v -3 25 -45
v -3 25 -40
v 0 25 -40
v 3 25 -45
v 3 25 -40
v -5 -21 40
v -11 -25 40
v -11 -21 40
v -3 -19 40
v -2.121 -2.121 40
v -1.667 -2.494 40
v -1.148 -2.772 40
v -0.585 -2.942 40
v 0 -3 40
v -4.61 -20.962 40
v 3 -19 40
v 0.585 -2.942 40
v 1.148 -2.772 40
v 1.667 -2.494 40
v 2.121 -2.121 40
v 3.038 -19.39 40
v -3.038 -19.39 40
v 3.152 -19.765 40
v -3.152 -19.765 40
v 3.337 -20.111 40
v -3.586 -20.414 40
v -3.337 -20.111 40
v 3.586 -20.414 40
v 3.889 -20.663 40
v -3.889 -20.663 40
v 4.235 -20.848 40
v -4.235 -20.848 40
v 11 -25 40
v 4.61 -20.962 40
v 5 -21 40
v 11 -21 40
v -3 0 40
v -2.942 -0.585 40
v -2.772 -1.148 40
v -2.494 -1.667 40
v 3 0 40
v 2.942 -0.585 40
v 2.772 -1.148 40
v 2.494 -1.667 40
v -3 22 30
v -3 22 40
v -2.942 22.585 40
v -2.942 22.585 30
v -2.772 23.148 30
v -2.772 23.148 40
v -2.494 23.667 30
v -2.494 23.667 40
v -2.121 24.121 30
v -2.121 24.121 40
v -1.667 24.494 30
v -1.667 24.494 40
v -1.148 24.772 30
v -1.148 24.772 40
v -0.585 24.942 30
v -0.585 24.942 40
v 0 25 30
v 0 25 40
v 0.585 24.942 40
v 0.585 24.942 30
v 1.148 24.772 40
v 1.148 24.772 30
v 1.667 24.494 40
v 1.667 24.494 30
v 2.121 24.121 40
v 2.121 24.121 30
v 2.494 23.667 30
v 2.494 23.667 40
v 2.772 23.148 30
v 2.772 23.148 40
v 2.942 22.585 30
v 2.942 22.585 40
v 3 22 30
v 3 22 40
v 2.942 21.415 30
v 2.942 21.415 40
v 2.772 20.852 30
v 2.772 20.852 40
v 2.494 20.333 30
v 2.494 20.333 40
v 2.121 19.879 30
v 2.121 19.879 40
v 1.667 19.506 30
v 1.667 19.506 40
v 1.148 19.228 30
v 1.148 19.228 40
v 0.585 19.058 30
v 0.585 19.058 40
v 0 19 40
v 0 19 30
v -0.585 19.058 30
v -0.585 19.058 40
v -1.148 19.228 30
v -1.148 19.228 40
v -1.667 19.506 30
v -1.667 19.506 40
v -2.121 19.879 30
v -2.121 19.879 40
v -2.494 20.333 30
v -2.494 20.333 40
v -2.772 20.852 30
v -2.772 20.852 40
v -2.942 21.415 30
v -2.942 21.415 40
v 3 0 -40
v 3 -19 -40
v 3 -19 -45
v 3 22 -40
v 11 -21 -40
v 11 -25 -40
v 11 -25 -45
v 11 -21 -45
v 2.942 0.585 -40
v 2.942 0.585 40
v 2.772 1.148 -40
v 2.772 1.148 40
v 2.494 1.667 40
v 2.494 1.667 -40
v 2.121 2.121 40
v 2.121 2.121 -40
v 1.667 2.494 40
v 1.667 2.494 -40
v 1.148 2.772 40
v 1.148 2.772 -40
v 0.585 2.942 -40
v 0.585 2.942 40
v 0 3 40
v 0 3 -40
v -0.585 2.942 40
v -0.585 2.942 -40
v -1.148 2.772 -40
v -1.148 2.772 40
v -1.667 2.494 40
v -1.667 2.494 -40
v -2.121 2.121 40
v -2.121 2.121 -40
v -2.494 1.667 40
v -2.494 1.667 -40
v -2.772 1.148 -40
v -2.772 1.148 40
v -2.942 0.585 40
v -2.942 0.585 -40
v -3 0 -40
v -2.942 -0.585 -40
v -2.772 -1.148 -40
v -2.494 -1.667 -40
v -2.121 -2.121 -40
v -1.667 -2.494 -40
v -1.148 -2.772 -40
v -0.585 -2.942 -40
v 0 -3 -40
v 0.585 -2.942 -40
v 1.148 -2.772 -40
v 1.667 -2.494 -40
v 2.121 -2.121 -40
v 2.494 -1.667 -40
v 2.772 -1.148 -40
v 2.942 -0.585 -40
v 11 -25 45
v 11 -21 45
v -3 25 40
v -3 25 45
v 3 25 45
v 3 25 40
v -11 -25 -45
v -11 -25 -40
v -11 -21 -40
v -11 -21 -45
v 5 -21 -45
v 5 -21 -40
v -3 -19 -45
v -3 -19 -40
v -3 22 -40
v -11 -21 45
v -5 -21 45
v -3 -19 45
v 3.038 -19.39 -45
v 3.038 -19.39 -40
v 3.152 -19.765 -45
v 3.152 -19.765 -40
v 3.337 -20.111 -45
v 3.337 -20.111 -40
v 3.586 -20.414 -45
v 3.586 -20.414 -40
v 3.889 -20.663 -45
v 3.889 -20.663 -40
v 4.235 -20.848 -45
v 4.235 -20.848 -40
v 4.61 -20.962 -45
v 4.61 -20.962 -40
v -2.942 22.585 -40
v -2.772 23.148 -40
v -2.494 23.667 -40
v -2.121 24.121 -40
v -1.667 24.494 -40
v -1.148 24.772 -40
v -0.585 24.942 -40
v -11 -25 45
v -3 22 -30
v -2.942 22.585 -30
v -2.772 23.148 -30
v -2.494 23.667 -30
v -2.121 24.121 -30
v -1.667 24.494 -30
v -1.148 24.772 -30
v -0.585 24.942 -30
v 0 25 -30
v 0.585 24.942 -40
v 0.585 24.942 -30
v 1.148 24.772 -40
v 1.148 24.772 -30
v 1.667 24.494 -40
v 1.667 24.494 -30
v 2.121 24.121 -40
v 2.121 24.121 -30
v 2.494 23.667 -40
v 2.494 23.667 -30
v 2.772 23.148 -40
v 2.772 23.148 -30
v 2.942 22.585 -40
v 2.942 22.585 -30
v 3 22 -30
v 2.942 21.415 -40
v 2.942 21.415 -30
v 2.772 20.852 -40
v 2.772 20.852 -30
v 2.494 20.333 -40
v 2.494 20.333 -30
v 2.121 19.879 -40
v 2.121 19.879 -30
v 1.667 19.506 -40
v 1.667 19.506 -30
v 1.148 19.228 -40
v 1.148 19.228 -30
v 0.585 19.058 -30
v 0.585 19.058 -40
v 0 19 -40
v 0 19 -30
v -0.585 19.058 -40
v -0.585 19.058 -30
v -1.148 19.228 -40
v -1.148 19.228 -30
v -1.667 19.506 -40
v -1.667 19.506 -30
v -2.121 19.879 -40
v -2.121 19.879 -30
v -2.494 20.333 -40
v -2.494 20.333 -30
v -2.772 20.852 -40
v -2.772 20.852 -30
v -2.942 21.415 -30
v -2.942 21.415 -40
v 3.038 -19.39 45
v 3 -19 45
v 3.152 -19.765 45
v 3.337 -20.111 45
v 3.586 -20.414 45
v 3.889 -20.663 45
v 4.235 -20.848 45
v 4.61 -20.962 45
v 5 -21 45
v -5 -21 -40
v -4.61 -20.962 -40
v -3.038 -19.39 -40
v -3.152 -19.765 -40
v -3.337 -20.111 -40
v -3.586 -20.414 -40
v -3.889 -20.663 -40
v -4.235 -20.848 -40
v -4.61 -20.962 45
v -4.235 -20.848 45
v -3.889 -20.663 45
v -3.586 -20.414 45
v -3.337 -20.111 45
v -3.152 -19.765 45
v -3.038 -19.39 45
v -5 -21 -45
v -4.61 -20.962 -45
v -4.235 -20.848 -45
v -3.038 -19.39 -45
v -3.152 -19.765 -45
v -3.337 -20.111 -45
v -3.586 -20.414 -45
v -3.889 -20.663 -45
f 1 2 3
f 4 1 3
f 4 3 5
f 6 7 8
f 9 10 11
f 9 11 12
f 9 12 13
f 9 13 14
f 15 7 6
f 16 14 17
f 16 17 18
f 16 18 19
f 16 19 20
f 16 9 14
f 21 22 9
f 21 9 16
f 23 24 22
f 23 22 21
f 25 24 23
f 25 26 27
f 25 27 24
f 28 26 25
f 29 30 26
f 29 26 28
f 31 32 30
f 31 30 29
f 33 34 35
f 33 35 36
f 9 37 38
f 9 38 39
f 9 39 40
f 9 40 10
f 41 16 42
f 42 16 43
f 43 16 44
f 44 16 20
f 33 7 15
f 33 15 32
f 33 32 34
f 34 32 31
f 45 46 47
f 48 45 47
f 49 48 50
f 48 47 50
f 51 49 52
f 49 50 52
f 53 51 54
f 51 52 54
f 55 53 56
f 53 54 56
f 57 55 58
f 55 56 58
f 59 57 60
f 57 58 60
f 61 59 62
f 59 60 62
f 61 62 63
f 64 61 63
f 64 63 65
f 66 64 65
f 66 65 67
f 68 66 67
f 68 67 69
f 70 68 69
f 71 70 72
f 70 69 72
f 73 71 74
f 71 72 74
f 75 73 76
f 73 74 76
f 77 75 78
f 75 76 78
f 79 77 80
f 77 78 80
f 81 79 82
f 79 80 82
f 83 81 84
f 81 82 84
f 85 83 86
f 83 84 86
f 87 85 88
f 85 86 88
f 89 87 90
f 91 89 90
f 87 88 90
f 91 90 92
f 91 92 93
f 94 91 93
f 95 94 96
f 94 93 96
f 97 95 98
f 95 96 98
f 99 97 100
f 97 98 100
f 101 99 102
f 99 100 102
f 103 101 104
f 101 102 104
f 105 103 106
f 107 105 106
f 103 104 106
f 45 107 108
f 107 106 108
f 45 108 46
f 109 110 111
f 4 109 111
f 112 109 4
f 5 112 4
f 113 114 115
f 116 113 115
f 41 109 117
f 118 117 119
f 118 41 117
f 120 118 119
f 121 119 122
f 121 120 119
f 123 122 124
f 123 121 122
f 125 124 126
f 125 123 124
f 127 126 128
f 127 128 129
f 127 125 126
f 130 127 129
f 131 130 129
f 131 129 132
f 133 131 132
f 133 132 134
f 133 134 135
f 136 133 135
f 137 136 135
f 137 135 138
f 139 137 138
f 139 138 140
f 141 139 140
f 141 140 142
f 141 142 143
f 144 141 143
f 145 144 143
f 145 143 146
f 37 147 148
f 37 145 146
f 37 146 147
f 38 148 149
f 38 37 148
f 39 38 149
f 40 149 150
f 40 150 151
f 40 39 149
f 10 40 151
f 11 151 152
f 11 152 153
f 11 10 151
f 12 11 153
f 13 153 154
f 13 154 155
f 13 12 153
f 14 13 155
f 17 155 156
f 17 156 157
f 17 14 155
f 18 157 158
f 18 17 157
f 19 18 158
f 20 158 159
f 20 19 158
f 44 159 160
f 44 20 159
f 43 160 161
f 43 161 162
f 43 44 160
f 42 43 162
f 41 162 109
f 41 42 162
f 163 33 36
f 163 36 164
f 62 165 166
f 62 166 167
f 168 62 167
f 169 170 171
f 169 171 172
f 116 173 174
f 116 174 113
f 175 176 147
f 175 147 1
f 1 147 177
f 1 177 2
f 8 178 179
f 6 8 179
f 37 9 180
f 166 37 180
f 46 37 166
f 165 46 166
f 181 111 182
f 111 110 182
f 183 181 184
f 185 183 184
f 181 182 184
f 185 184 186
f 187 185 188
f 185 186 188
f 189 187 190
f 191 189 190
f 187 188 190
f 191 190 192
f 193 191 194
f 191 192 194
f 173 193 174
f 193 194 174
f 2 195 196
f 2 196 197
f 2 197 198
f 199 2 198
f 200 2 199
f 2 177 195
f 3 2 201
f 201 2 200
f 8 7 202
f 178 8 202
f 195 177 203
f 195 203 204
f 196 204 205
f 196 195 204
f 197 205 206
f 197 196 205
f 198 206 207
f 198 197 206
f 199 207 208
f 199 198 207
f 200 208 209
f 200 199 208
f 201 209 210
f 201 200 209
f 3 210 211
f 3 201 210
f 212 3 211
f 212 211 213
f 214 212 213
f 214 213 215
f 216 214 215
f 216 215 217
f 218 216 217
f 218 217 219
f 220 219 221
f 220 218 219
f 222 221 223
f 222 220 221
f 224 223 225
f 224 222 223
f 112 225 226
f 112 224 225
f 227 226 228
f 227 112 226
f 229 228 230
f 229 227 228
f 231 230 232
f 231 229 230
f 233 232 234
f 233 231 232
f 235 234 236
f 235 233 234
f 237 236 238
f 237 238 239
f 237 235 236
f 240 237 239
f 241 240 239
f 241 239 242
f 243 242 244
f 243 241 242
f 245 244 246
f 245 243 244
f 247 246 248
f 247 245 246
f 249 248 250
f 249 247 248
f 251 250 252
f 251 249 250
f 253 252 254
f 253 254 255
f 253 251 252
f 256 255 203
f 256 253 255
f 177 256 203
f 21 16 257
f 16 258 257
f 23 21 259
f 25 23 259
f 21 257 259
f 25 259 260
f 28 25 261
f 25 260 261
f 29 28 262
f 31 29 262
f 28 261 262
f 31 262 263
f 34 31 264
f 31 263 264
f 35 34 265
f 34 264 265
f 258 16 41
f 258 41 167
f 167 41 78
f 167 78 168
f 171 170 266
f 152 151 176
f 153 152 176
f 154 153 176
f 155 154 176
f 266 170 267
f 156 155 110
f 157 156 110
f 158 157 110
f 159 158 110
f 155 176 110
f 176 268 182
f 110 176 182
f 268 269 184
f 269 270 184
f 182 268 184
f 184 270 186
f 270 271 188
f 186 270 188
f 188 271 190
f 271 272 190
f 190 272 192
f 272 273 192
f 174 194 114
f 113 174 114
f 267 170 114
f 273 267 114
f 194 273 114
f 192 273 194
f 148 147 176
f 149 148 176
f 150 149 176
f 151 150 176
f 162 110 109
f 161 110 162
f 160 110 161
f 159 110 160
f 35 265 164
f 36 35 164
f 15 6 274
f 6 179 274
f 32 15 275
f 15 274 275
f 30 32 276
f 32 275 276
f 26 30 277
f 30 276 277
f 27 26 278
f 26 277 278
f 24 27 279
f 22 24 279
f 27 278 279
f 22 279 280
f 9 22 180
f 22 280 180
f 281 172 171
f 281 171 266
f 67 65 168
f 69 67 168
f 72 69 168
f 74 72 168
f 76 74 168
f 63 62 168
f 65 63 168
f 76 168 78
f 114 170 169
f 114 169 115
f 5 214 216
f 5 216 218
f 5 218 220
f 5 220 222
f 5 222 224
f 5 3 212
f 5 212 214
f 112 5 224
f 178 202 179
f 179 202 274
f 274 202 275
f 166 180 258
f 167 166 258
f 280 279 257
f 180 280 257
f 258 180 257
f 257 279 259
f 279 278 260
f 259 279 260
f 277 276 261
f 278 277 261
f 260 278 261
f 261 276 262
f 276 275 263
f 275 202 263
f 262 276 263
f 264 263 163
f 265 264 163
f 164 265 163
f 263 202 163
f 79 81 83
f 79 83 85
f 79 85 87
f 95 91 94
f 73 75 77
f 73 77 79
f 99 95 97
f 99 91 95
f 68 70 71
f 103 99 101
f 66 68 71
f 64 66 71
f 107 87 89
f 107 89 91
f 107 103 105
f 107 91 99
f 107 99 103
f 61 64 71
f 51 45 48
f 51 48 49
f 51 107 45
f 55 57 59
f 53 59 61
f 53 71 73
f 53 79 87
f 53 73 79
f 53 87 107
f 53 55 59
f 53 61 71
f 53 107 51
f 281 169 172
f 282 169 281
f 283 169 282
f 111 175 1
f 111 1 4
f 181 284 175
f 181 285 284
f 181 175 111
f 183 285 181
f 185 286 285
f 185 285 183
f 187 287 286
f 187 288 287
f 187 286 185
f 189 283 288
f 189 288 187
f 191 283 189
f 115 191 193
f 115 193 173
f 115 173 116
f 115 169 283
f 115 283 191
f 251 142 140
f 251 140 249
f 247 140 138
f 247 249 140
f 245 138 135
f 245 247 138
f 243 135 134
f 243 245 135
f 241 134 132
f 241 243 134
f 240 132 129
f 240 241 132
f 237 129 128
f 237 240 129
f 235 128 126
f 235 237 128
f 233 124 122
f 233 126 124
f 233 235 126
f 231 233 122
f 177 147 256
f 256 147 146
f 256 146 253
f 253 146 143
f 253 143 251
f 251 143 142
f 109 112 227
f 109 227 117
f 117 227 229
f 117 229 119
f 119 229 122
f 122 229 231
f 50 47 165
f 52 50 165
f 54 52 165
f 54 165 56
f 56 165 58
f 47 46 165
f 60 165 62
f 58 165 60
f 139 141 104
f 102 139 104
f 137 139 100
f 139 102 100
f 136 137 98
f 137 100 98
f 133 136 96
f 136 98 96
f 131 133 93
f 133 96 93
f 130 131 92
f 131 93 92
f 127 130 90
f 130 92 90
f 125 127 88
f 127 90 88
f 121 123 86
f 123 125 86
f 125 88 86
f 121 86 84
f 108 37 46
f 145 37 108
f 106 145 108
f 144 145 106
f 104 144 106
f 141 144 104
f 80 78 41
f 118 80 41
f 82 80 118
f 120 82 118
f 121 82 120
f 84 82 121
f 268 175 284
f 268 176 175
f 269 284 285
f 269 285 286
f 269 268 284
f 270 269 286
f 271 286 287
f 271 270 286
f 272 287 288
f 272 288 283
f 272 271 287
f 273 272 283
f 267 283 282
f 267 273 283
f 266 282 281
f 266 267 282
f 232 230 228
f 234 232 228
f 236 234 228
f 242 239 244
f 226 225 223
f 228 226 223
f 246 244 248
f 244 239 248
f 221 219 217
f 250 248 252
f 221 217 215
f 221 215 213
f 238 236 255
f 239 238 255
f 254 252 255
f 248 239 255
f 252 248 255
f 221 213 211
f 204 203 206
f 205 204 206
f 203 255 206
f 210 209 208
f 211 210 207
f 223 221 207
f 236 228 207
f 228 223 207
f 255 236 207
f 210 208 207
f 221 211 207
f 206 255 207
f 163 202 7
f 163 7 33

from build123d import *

# Parameters (mm, degrees)
SKETCH1_R            = 3
BOSS_EXTRUDE1_DEPTH  = 40
SKETCH2_W            = 6
SKETCH2_H            = 50
BOSS_EXTRUDE2_DEPTH  = 5
SKETCH9_W            = 22
SKETCH9_H            = 5
BOSS_EXTRUDE5_DEPTH  = 4
FILLET1_R            = 2
SKETCH11_R           = 3
BOSS_EXTRUDE7_DEPTH  = 10
FILLET1_OF_MIRROR5_R = 2


with BuildPart() as part:
    # Sketch1 → Boss-Extrude1 (new, symmetric)
    with BuildSketch(Plane.XY):
        Circle(SKETCH1_R)
    extrude(amount=BOSS_EXTRUDE1_DEPTH, both=True)

    # Sketch2 → Boss-Extrude2 (add)
    with BuildSketch(Plane.XY.offset(40)):
        Rectangle(SKETCH2_W, SKETCH2_H)
    boss_extrude2 = extrude(amount=BOSS_EXTRUDE2_DEPTH)

    # Sketch9 → Boss-Extrude5 (add)
    with BuildSketch(Plane.XZ.offset(25)):
        with Locations((0, 42.5)):
            Rectangle(SKETCH9_W, SKETCH9_H)
    boss_extrude5 = extrude(amount=-BOSS_EXTRUDE5_DEPTH)

    # Fillet1
    fillet1_edges = [part.edges().sort_by_distance(p)[0] for p in [
        (-3, -21, 42.5),
        (3, -21, 42.5),
    ]]
    fillet(fillet1_edges, radius=FILLET1_R)

    # Sketch11 → Boss-Extrude7 (add)
    with BuildSketch(Plane(origin=(0, 0, 40), x_dir=(-1, 0, 0), z_dir=(0, 0, -1))):
        with Locations((0, 22)):
            Circle(SKETCH11_R)
    boss_extrude7 = extrude(amount=BOSS_EXTRUDE7_DEPTH)

    # Mirror5: Boss-Extrude2, Boss-Extrude5, Boss-Extrude7 across plane
    add(boss_extrude2.mirror(Plane.XY))
    add(boss_extrude5.mirror(Plane.XY))
    add(boss_extrude7.mirror(Plane.XY))

    # Fillet1 of Mirror5
    fillet1_of_mirror5_edges = [part.edges().sort_by_distance(p)[0] for p in [
        (-3, -21, -42.5),
        (3, -21, -42.5),
    ]]
    fillet(fillet1_of_mirror5_edges, radius=FILLET1_OF_MIRROR5_R)

    # Mirror1: Boss-Extrude2 across plane
    add(boss_extrude2.mirror(Plane.XY))


solid = part.part
